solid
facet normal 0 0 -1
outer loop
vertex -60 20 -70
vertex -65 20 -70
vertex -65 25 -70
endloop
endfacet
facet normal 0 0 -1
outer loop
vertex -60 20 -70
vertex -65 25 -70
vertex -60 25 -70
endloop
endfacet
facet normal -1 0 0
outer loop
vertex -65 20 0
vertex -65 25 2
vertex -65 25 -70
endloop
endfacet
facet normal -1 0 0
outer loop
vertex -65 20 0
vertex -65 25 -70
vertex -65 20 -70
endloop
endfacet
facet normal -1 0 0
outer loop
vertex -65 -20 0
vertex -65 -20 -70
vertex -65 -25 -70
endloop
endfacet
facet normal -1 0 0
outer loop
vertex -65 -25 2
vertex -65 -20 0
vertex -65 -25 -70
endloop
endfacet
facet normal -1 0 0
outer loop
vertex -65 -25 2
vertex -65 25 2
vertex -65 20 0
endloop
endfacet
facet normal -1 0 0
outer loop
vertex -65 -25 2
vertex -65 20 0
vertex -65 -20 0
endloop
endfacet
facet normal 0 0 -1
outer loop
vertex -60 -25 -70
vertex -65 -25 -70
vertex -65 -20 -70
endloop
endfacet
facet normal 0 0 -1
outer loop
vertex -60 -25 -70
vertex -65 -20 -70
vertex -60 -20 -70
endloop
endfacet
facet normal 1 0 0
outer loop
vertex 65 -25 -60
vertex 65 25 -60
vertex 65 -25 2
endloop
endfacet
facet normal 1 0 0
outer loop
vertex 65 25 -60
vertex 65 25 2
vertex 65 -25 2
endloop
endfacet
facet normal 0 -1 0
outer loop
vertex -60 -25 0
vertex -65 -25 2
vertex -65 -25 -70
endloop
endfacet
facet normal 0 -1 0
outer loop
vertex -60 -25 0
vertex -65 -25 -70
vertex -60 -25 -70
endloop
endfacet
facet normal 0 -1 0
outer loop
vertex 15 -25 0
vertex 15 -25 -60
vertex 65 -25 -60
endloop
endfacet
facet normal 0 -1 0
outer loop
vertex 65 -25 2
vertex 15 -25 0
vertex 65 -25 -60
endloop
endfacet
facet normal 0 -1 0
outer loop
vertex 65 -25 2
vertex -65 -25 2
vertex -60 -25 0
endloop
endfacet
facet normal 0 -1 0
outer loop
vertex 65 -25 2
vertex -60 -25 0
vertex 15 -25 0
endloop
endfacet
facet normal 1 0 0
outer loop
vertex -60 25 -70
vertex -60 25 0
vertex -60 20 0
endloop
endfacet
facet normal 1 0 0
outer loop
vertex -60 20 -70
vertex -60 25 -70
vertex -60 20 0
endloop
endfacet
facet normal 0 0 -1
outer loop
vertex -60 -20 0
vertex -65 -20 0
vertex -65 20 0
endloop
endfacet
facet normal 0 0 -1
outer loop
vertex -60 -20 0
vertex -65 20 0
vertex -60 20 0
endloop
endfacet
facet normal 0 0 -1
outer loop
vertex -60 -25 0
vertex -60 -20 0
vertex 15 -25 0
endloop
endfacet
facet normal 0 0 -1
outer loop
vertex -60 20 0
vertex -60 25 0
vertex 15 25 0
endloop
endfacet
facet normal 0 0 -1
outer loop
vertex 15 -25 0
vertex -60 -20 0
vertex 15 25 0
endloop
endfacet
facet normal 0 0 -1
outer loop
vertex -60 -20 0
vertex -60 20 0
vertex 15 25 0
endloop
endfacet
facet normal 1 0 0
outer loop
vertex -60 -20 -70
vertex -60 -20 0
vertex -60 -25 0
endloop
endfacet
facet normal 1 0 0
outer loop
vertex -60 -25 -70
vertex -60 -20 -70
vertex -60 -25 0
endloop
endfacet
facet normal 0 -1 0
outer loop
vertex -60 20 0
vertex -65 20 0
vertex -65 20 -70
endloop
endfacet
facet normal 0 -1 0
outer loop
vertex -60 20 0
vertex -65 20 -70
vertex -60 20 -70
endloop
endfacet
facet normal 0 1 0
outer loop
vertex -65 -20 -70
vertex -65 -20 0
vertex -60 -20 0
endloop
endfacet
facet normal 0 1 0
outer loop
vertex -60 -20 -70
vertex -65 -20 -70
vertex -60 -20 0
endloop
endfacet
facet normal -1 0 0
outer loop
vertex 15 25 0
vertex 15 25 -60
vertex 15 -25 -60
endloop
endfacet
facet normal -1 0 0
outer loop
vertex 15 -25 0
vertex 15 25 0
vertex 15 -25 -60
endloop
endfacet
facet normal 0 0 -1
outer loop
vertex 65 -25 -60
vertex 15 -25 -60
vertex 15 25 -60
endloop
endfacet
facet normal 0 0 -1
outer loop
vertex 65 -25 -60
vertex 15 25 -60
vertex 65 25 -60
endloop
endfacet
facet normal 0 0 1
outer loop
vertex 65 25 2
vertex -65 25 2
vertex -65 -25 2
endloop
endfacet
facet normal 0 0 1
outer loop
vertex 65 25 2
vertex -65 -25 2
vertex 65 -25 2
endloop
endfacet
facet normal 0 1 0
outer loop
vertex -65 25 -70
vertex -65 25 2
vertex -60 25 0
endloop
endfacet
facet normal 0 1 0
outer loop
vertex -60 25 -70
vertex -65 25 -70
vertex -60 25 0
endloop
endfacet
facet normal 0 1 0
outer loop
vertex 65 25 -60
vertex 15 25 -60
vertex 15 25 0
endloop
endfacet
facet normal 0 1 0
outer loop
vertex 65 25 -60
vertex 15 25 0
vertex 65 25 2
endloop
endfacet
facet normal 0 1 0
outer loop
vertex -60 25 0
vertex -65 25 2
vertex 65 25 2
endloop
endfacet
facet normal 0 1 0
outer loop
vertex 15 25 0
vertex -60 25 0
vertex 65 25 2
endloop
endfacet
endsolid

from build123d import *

# Parameters (mm, degrees)
F0_W     = 130
F0_H     = 50
F1_DEPTH = 2
F2_W     = 50
F2_H     = 50
F3_DEPTH = 60
F4_W     = 5
F4_H     = 5
F5_DEPTH = 70


with BuildPart() as f1:
    # F0 (on Top) → F1 (new body)
    with BuildSketch(Plane.XY):
        Rectangle(F0_W, F0_H)
    extrude(amount=F1_DEPTH)

    # F2 (on face) → F3 (join)
    with BuildSketch(Plane(origin=(0, 0, 0), x_dir=(1, 0, 0), z_dir=(0, 0, -1))):
        with Locations((40, 0)):
            Rectangle(F2_W, F2_H)
    extrude(amount=F3_DEPTH)

    # F4 (on face) → F5 (join)
    with BuildSketch(Plane(origin=(0, 0, 0), x_dir=(1, 0, 0), z_dir=(0, 0, -1))):
        with Locations((-62.5, 22.5)):
            Rectangle(F4_W, F4_H)
        with Locations((-62.5, -22.5)):
            Rectangle(F4_W, F4_H)
    extrude(amount=F5_DEPTH)


solid = f1.part
